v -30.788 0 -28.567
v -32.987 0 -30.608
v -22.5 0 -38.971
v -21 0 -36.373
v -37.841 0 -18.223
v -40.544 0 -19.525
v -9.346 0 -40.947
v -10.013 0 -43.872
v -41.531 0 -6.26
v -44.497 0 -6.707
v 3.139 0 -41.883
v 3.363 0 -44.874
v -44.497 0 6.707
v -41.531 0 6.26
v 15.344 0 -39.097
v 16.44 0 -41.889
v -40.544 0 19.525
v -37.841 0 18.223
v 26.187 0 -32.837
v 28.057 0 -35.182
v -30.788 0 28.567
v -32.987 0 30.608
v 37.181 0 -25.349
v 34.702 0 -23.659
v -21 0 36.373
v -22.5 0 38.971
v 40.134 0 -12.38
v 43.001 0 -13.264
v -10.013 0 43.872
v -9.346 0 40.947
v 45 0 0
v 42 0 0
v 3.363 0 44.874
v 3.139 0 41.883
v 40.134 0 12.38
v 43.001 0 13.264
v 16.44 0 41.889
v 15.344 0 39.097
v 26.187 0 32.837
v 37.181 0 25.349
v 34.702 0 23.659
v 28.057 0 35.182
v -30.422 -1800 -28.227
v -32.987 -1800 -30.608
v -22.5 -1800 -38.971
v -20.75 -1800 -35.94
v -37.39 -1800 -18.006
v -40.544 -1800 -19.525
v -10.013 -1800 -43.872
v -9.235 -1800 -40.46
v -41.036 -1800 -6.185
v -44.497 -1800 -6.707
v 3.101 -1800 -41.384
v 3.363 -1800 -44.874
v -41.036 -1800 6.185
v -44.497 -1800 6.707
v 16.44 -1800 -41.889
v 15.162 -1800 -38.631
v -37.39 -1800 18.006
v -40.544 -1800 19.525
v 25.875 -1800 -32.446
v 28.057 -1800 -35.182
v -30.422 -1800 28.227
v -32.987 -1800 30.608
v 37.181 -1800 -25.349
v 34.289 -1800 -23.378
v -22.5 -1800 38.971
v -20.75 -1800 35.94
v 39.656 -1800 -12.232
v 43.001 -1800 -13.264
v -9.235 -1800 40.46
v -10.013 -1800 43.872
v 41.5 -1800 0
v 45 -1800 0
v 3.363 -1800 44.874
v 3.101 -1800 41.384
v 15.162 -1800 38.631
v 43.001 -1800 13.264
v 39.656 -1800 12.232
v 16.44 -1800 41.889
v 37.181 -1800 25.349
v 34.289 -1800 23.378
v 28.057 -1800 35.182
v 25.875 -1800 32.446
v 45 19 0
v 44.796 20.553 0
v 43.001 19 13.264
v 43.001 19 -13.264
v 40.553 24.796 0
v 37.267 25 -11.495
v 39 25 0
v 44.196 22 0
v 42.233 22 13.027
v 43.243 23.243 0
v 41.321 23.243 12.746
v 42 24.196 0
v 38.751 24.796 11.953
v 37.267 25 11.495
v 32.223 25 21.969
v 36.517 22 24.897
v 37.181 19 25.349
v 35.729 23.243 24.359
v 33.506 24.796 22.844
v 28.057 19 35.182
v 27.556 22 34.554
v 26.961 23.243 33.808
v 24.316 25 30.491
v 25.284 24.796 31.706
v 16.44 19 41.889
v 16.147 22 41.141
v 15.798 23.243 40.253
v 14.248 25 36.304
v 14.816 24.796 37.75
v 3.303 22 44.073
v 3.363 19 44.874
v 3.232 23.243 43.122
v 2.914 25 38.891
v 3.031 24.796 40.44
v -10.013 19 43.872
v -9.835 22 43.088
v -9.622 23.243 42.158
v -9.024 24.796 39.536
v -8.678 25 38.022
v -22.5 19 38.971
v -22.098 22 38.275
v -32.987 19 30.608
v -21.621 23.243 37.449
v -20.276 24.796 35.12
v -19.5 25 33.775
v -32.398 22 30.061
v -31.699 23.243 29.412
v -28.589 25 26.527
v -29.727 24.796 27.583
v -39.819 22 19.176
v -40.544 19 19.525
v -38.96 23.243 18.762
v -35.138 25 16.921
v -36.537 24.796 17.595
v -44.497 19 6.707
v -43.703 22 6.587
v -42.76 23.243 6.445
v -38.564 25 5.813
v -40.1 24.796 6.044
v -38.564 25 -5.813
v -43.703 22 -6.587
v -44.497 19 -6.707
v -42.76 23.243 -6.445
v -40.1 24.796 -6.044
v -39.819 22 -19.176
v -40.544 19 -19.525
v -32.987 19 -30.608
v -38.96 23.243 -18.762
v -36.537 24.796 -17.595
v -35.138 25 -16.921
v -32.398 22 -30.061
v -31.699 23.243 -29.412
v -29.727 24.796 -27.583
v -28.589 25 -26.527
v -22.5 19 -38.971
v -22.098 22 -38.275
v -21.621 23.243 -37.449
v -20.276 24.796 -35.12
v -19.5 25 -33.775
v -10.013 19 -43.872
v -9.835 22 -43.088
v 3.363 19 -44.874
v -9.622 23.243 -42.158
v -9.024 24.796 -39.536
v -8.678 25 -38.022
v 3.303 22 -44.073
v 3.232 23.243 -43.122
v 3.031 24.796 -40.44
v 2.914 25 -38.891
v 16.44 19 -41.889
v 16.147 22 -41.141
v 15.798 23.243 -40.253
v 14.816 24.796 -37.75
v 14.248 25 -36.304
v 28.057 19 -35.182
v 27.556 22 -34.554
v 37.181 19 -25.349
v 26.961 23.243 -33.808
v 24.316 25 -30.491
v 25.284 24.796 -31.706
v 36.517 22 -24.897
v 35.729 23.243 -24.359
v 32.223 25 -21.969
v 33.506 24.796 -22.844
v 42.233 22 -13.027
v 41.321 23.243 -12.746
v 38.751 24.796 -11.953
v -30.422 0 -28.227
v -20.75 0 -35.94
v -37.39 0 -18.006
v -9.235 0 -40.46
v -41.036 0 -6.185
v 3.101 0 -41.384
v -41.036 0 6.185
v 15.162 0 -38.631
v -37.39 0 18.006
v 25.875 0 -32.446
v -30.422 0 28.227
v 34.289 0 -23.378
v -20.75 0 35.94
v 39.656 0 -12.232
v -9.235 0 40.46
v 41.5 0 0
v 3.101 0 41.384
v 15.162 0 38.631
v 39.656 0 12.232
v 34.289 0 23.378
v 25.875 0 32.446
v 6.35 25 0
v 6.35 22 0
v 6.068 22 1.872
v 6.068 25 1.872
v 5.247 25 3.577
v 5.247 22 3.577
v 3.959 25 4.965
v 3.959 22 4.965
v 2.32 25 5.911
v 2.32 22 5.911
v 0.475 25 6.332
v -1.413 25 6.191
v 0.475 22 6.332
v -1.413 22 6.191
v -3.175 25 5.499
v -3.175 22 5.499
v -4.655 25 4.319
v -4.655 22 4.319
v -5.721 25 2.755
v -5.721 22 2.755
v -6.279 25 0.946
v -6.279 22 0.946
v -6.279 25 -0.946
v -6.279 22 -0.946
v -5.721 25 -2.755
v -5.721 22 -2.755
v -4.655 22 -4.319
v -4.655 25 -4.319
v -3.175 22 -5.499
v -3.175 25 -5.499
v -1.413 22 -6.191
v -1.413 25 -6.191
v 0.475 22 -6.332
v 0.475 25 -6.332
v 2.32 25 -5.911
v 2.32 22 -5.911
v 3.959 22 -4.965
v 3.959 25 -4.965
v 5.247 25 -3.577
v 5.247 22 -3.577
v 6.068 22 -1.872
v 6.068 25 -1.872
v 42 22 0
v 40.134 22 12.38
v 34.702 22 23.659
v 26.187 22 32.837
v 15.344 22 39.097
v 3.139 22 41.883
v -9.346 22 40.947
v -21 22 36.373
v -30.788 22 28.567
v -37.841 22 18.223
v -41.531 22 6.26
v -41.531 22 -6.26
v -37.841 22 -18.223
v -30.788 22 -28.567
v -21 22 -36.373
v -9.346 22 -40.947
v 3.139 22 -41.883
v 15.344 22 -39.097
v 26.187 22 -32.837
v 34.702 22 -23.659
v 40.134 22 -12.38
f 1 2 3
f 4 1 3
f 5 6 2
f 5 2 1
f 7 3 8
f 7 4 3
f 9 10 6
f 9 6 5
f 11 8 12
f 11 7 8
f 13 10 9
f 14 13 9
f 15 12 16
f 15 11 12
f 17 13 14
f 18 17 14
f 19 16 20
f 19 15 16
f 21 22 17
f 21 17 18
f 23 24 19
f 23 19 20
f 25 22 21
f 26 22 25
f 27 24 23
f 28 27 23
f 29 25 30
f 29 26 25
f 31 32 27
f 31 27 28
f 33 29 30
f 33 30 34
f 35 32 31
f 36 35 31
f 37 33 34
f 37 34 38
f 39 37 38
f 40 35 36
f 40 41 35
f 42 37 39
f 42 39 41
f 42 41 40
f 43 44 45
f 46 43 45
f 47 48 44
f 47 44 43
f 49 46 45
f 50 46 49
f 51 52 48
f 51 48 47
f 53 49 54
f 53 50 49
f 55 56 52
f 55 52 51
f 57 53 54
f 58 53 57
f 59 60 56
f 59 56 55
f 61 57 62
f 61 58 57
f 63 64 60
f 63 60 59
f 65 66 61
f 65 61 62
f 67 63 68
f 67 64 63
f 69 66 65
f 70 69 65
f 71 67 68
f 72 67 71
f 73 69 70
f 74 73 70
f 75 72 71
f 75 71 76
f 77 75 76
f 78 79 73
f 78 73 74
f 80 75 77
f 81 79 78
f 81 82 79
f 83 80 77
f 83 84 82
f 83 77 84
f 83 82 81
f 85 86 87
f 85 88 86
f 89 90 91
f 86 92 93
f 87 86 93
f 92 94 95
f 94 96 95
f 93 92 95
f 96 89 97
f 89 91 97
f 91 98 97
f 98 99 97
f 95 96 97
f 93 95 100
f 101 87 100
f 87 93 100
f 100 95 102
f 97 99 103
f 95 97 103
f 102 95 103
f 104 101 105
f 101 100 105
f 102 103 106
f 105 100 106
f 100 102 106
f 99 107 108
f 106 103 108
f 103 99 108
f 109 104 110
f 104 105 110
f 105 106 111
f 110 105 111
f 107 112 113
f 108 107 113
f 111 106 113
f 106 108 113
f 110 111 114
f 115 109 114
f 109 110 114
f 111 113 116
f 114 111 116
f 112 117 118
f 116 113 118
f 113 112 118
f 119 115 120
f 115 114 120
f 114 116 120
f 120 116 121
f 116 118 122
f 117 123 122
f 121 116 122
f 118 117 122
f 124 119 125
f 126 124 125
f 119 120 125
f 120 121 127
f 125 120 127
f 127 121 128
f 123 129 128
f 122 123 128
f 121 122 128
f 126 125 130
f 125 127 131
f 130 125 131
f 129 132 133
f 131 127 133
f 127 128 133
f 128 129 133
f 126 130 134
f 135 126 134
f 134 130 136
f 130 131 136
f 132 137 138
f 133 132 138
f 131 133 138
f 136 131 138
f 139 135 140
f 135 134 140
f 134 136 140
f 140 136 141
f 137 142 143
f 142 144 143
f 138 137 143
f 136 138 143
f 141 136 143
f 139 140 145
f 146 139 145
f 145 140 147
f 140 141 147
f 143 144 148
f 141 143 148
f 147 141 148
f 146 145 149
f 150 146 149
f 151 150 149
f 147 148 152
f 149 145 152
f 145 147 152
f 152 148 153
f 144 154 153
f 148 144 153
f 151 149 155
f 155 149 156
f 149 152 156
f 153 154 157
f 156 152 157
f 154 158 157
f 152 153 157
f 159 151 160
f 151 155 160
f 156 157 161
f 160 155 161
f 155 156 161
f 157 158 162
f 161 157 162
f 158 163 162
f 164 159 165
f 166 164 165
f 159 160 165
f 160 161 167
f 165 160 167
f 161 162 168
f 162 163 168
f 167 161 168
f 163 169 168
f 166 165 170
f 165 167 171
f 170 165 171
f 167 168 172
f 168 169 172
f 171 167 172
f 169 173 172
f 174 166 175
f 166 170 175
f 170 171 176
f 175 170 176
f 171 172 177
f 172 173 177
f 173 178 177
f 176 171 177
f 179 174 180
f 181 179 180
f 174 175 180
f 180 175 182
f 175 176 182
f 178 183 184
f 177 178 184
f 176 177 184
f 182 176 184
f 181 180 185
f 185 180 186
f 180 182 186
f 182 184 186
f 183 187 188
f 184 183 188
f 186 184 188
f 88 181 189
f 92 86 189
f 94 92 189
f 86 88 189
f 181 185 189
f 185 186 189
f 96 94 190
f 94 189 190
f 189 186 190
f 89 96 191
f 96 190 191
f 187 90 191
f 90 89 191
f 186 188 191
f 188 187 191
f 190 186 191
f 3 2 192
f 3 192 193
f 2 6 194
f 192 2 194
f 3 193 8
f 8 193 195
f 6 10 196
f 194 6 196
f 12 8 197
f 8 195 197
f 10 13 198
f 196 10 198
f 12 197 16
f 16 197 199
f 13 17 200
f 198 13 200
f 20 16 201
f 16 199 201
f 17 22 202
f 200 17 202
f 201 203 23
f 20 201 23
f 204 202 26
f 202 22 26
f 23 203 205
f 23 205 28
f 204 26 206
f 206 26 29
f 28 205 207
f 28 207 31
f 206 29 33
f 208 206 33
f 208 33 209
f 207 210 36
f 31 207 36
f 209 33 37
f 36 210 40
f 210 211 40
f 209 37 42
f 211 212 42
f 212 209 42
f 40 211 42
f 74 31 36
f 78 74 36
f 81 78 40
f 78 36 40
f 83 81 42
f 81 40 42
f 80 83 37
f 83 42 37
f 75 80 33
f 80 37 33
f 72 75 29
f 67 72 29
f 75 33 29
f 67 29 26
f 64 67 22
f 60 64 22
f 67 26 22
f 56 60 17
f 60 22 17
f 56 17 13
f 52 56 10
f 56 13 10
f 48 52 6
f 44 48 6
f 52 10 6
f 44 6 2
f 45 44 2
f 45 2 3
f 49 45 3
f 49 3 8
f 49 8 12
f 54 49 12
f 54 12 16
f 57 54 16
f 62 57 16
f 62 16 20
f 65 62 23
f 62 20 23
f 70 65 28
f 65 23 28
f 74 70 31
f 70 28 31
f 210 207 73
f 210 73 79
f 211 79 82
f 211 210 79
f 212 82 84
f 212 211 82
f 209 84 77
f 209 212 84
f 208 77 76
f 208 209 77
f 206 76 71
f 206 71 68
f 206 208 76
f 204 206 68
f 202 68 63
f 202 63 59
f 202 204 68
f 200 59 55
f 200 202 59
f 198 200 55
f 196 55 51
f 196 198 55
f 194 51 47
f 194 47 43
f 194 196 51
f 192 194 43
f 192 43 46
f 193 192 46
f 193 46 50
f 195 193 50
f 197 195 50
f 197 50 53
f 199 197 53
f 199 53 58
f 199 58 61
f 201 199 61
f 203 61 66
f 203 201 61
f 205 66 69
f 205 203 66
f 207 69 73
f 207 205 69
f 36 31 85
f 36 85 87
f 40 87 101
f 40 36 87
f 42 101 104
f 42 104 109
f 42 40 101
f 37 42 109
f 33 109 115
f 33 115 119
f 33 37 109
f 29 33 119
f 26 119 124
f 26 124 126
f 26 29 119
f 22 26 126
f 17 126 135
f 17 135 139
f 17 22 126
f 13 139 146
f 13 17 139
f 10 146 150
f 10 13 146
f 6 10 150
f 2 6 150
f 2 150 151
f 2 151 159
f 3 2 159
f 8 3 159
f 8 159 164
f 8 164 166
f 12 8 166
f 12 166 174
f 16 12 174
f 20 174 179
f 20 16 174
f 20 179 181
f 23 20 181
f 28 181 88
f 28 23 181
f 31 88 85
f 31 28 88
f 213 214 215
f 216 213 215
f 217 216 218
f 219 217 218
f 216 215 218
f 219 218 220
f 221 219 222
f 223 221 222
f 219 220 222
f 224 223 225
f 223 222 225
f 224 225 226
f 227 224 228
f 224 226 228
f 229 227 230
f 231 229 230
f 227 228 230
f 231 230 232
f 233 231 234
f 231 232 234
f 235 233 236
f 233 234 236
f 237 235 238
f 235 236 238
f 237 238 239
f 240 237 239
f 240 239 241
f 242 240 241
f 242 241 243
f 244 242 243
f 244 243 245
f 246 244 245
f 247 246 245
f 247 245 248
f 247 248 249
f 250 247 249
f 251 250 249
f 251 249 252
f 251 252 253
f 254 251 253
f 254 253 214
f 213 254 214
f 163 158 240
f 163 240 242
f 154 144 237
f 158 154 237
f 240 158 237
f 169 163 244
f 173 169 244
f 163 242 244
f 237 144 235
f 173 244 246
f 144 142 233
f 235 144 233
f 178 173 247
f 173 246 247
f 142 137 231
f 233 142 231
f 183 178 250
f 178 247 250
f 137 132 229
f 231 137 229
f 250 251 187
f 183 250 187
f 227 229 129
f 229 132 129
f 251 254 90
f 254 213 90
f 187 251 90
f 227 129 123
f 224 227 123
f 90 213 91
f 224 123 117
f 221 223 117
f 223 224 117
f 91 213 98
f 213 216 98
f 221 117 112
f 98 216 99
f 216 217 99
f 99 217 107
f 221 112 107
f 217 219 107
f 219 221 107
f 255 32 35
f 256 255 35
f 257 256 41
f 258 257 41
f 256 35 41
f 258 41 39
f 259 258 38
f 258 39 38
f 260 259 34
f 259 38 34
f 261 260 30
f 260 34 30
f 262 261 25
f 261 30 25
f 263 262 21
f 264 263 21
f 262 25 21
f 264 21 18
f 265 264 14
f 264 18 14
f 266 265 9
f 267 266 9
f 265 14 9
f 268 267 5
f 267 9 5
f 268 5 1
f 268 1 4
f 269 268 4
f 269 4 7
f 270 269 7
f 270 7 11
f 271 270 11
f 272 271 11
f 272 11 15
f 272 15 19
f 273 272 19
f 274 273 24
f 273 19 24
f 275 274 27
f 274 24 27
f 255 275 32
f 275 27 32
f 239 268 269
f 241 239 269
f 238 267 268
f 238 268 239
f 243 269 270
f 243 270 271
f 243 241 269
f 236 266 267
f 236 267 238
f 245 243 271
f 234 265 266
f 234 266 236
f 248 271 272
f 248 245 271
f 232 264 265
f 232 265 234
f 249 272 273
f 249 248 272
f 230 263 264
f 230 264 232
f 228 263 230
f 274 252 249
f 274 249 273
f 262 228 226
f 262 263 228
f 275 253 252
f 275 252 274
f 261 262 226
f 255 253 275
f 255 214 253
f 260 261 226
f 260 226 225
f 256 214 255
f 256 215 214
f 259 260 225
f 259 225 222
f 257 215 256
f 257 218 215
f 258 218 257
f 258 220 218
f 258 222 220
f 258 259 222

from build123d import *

# Parameters (mm, degrees)
F0_R     = 45
F0_R_2   = 41.5
F1_DEPTH = 1800
F2_R     = 45
F2_R_2   = 42
F2_R_3   = 6.35
F3_DEPTH = 25
F4_DEPTH = 22
F5_R     = 6
F6_DEPTH = 26


with BuildPart() as f1:
    # F0 (on Front) → F1 (new body)
    with BuildSketch(Plane.XZ):
        Circle(F0_R)
        Circle(F0_R_2, mode=Mode.SUBTRACT)
    extrude(amount=F1_DEPTH)

    # F2 (on Front) → F6 (cut)
    with BuildSketch(Plane.XZ):
        Circle(F2_R_3)
    extrude(amount=-F6_DEPTH, mode=Mode.SUBTRACT)


with BuildPart() as f3:
    # F2 (on Front) → F3 (new body)
    with BuildSketch(Plane.XZ):
        Circle(F2_R)
        Circle(F2_R_2, mode=Mode.SUBTRACT)
        Circle(F2_R_2)
        Circle(F2_R_3, mode=Mode.SUBTRACT)
    extrude(amount=-F3_DEPTH)

    # F2 (on Front) → F4 (cut)
    with BuildSketch(Plane.XZ):
        Circle(F2_R_2)
        Circle(F2_R_3, mode=Mode.SUBTRACT)
    extrude(amount=-F4_DEPTH, mode=Mode.SUBTRACT)

    # F5
    f5_edges = [f3.edges().sort_by_distance(p)[0] for p in [
        (-45, 25, 0),
    ]]
    fillet(f5_edges, radius=F5_R)


solid = Compound([f1.part, f3.part])
